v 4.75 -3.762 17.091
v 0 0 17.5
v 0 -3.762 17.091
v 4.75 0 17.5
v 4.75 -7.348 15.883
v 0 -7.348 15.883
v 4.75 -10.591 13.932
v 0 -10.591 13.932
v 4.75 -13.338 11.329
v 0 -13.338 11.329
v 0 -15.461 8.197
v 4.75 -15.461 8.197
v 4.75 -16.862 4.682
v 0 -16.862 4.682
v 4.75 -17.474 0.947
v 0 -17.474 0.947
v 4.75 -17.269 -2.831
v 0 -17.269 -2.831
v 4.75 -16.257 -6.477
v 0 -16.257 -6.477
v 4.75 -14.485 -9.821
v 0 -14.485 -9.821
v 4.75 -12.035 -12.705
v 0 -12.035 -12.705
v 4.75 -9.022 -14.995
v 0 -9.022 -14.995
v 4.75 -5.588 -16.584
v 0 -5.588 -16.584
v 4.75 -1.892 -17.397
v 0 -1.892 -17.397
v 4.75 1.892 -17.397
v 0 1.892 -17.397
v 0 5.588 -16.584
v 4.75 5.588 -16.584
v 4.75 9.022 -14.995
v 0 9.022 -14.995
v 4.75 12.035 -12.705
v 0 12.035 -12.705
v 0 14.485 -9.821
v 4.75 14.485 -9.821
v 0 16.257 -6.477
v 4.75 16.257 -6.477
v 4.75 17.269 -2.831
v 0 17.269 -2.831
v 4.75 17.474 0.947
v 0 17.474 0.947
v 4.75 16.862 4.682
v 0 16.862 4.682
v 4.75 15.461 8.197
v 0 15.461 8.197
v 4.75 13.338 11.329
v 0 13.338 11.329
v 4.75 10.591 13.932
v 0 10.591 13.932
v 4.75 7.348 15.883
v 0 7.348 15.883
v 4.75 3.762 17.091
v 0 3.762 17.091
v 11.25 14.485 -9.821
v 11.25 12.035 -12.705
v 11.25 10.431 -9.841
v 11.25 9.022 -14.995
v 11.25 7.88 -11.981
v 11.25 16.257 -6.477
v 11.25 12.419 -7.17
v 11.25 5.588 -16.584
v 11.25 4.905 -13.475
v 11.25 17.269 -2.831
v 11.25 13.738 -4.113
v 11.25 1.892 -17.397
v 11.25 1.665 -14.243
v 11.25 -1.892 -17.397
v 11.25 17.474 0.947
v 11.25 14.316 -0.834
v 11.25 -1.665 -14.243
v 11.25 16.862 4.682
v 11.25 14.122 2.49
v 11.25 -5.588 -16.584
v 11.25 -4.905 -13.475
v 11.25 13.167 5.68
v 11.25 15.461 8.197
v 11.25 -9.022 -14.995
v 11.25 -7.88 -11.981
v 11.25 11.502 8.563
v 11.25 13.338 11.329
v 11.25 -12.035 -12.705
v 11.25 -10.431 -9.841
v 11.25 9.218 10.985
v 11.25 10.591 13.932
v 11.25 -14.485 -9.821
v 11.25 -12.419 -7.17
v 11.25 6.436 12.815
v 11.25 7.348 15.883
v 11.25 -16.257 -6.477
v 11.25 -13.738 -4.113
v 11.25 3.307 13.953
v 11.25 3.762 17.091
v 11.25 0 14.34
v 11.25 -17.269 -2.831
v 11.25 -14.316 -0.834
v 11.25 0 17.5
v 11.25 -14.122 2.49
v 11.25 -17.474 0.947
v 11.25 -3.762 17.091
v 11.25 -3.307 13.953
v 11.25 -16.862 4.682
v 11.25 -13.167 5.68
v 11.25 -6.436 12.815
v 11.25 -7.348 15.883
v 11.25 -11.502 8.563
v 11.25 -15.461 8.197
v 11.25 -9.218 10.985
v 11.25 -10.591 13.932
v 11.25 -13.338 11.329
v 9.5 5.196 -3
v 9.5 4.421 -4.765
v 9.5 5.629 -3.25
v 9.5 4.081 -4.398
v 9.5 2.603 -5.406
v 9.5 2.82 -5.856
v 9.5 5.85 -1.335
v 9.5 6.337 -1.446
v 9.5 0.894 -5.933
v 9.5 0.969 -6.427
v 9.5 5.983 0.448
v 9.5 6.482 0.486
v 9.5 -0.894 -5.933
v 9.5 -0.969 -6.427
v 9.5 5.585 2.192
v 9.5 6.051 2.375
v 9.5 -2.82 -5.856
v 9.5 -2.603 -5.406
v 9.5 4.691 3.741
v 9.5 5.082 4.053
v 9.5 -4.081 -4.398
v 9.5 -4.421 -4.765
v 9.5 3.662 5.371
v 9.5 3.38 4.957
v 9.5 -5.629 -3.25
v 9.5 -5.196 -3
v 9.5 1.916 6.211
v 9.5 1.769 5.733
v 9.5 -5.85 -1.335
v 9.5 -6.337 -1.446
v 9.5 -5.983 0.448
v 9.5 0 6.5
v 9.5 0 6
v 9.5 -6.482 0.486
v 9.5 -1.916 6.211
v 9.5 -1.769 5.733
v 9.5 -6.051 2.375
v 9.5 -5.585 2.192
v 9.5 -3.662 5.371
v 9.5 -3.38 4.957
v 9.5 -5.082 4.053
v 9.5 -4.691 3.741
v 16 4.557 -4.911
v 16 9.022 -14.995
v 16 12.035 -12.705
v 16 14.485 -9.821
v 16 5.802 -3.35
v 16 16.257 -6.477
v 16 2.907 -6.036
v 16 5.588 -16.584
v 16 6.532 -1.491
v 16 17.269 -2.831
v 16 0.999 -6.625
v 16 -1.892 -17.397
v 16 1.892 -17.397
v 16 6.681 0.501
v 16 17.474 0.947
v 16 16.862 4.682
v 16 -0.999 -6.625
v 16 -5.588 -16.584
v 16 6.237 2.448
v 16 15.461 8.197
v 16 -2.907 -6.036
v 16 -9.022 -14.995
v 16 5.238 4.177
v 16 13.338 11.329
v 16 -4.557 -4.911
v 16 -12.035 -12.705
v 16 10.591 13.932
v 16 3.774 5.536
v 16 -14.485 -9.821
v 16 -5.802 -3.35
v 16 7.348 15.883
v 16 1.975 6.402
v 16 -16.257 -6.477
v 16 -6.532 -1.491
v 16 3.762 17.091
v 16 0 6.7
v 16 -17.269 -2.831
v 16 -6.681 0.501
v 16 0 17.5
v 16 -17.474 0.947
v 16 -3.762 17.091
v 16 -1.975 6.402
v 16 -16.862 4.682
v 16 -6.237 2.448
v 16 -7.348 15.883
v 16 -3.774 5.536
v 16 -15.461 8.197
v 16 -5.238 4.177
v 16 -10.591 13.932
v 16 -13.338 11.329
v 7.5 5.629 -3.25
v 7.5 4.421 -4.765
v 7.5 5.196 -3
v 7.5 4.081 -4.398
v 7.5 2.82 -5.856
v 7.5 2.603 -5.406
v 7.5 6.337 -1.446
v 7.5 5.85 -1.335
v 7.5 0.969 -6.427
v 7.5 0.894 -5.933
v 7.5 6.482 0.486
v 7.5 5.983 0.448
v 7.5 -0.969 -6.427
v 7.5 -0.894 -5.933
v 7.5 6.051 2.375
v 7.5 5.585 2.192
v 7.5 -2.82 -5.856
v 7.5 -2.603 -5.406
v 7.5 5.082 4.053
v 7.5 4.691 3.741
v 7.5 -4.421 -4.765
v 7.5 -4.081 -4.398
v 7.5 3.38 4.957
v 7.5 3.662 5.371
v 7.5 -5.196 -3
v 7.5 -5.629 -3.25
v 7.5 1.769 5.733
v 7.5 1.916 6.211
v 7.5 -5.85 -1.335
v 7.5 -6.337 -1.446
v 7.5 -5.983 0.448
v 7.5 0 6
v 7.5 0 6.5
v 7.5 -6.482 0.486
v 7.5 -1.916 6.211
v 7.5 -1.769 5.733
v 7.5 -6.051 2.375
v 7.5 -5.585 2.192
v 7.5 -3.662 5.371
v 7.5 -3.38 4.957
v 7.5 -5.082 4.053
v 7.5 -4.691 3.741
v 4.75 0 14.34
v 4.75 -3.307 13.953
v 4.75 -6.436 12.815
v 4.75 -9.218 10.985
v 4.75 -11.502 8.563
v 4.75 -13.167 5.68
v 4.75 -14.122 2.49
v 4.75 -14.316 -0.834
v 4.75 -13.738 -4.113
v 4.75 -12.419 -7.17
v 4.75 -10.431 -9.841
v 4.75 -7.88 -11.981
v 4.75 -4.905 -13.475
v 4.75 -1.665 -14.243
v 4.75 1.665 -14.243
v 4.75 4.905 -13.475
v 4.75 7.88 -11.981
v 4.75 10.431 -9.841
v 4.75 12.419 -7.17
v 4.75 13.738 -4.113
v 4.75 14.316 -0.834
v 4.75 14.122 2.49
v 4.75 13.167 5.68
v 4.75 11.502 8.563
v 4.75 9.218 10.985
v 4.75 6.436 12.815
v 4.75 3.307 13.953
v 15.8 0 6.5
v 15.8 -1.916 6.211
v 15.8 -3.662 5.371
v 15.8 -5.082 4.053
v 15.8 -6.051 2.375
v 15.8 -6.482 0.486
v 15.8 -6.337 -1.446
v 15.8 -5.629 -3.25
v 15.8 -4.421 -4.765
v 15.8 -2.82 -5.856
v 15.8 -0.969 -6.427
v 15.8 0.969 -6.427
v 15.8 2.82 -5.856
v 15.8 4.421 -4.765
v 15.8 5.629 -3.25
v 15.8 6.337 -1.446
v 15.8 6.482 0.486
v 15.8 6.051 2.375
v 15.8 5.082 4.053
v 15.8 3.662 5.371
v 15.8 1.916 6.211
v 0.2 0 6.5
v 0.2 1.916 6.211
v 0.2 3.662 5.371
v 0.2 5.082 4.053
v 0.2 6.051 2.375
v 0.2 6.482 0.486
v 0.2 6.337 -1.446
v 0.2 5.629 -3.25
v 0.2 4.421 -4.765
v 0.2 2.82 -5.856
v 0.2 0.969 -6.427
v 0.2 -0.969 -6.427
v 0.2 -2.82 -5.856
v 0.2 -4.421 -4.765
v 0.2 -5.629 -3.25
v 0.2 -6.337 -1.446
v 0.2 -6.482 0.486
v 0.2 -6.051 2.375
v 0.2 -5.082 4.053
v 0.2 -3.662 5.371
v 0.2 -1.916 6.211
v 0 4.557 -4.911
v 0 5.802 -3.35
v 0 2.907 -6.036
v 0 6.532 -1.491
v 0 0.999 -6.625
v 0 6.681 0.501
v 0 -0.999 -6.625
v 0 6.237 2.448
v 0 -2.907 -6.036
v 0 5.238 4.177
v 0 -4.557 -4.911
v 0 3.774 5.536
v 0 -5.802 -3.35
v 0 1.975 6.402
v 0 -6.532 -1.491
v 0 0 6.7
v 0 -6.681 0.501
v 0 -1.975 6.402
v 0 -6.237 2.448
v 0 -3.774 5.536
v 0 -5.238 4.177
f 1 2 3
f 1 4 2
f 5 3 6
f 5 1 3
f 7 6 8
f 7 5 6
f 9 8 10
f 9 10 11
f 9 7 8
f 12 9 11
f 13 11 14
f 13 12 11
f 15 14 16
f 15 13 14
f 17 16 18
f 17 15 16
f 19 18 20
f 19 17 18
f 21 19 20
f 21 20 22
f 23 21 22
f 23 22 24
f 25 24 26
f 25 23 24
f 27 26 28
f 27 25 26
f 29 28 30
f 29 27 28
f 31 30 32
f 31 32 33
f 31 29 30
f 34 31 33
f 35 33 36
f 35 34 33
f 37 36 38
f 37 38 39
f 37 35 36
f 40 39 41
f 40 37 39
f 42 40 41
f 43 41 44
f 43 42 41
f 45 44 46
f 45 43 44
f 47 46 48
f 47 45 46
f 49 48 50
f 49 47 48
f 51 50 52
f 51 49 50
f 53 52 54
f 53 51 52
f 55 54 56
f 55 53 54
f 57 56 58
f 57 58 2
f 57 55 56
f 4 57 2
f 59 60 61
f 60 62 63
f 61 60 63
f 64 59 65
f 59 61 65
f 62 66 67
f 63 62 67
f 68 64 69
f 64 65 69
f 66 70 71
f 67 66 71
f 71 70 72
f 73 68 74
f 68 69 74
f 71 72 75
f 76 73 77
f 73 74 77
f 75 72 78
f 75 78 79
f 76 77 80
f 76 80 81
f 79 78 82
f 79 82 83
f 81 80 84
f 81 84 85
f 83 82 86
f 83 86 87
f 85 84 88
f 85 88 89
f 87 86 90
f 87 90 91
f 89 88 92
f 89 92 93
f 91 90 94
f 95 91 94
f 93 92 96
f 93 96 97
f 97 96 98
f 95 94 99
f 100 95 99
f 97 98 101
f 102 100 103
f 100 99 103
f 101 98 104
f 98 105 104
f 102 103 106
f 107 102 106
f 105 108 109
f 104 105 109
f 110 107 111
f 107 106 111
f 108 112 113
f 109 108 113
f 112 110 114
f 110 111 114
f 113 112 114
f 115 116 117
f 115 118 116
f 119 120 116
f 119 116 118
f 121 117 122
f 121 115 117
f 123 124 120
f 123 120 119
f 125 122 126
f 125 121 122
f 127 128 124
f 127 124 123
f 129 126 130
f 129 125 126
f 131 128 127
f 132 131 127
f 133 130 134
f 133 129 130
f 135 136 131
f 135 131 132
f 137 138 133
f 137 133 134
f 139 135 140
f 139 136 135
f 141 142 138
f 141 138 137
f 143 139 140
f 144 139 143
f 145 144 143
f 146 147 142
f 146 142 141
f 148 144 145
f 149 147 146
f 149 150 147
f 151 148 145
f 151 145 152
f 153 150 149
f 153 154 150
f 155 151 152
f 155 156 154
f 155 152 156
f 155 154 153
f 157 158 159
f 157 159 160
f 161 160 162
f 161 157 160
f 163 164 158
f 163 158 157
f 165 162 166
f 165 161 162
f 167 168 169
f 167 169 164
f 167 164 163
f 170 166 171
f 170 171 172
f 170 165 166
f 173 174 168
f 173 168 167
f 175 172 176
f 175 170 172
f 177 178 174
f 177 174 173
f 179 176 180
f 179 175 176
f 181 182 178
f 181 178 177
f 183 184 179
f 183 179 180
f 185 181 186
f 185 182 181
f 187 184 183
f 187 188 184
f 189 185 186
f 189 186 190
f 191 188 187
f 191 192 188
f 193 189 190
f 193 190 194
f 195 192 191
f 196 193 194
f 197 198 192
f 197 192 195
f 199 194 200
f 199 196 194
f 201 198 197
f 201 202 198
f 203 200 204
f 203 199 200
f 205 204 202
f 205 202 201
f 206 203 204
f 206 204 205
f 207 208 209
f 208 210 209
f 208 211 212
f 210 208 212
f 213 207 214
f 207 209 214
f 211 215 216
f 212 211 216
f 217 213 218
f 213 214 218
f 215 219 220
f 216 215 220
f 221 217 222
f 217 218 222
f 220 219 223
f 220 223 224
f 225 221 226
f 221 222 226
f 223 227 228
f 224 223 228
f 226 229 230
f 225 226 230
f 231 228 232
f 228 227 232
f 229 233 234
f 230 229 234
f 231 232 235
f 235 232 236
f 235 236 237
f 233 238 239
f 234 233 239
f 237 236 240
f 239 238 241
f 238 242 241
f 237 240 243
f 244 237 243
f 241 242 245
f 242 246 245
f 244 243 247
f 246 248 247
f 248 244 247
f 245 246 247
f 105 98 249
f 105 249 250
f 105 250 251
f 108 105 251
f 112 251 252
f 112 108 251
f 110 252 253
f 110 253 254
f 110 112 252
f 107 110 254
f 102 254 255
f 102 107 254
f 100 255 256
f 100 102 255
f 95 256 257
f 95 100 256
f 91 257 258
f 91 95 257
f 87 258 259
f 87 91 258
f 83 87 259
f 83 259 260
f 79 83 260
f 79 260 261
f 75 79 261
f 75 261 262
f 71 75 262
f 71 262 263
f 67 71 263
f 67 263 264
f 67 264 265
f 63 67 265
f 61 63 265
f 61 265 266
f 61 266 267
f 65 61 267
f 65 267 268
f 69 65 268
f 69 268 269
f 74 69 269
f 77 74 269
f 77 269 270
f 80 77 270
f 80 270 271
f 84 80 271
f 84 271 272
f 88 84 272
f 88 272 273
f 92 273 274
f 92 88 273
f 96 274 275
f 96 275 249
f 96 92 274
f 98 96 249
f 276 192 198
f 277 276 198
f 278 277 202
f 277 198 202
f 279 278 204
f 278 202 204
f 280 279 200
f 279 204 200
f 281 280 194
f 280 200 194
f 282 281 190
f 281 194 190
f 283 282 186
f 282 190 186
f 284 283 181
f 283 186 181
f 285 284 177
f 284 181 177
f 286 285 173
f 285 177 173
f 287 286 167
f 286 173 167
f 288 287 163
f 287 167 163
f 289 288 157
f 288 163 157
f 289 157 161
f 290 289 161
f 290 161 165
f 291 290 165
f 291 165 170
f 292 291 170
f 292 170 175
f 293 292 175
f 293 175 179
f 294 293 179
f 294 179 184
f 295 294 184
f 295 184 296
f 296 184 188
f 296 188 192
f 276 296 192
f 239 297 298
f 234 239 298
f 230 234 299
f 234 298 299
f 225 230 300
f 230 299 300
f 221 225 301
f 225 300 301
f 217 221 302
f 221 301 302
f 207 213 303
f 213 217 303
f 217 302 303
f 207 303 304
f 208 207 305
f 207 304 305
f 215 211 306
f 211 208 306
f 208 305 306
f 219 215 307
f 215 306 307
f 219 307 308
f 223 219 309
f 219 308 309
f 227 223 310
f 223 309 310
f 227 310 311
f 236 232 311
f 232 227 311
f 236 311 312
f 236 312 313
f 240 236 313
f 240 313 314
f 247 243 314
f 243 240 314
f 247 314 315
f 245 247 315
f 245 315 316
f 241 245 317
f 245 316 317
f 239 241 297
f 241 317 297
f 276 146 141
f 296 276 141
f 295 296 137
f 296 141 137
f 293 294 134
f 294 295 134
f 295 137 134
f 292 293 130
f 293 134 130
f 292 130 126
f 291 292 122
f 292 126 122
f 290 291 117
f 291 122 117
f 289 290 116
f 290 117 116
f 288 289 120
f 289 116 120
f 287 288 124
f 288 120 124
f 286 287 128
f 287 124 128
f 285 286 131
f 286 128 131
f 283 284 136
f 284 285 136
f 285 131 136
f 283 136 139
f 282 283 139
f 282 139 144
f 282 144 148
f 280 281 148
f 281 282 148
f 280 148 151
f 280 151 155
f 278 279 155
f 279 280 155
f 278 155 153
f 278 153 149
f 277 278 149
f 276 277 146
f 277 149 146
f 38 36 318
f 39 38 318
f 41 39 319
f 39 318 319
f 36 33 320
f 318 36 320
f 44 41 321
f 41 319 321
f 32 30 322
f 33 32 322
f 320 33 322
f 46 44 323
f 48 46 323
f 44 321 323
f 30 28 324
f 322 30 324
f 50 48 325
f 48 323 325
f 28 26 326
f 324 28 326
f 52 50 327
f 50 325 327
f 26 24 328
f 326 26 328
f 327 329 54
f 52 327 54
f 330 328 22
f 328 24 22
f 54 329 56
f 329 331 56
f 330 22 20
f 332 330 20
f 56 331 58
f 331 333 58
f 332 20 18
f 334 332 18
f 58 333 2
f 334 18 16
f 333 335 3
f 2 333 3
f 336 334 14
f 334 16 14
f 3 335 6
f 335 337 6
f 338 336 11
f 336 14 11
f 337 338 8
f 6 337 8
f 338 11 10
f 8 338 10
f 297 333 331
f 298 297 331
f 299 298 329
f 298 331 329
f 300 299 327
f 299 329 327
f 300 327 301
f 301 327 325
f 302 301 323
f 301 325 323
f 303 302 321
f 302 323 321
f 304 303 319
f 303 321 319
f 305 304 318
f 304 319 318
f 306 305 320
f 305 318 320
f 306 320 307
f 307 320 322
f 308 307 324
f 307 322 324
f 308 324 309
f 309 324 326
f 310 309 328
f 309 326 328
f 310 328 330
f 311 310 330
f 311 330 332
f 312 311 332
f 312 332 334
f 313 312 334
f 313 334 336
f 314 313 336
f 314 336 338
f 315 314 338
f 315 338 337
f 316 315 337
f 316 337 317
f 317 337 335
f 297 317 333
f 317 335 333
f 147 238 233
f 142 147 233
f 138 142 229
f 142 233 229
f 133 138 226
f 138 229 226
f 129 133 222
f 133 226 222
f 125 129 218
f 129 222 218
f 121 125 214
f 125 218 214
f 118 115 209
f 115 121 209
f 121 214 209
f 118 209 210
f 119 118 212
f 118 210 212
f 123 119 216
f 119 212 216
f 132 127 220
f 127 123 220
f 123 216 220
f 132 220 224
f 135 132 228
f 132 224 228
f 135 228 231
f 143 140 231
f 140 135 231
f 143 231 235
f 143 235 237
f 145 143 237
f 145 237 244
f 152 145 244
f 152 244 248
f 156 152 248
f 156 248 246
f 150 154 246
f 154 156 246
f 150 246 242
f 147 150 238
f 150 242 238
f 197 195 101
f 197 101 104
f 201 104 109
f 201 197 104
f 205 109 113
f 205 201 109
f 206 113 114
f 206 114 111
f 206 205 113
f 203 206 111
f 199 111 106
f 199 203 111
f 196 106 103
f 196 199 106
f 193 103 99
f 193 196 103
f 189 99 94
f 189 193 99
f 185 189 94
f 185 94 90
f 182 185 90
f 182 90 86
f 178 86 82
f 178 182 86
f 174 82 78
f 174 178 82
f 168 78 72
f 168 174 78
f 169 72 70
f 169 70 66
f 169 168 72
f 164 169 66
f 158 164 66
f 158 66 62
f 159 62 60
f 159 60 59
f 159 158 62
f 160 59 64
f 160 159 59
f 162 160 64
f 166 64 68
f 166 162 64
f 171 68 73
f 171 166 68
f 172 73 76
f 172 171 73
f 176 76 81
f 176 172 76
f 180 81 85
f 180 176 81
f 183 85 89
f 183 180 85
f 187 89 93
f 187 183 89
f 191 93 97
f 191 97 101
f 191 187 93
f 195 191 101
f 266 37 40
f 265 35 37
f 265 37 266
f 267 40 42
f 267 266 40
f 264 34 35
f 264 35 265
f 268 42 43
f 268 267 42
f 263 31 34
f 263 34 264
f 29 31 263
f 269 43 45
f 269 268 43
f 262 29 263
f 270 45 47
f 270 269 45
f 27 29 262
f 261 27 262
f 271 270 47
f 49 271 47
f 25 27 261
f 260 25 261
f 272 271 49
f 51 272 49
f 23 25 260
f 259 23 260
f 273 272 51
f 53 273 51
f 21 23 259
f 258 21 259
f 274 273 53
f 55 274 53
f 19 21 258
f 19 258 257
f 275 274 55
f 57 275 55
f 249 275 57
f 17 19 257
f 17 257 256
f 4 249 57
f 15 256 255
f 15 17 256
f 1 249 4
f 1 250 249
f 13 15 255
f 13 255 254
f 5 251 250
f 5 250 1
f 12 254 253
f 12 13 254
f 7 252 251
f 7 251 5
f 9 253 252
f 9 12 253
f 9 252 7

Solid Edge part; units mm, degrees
sketch "Sketch1" plane through (0, 0, 0) normal (0, -1, 0) x (1, 0, 0)
  line L0 (11.25, 17.5) -> (16, 17.5)
  line L1 (16, 17.5) -> (16, 6.5)
  line L2 (16, 6.5) -> (9.5, 6.5)
  line L3 (9.5, 6.5) -> (9.5, 6)
  line L4 (9.5, 6) -> (7.5, 6)
  line L5 (7.5, 6) -> (7.5, 6.5)
  line L6 (7.5, 6.5) -> (0, 6.5)
  line L7 (0, 6.5) -> (0, 17.5)
  line L8 (0, 17.5) -> (4.75, 17.5)
  line L9 (4.75, 17.5) -> (4.75, 14.34)
  line L10 (4.75, 14.34) -> (11.25, 14.34)
  line L11 (11.25, 14.34) -> (11.25, 17.5)
revolve "RevolvedProtrusion1" add sketch "Sketch1" angle 360 about axis through (0, 0, 0) along (1, 0, 0)
chamfer "Chamfer1" distance 0.2 angle 45 2 edges at (16, 0, -6.5) (0, 0, -6.5)
